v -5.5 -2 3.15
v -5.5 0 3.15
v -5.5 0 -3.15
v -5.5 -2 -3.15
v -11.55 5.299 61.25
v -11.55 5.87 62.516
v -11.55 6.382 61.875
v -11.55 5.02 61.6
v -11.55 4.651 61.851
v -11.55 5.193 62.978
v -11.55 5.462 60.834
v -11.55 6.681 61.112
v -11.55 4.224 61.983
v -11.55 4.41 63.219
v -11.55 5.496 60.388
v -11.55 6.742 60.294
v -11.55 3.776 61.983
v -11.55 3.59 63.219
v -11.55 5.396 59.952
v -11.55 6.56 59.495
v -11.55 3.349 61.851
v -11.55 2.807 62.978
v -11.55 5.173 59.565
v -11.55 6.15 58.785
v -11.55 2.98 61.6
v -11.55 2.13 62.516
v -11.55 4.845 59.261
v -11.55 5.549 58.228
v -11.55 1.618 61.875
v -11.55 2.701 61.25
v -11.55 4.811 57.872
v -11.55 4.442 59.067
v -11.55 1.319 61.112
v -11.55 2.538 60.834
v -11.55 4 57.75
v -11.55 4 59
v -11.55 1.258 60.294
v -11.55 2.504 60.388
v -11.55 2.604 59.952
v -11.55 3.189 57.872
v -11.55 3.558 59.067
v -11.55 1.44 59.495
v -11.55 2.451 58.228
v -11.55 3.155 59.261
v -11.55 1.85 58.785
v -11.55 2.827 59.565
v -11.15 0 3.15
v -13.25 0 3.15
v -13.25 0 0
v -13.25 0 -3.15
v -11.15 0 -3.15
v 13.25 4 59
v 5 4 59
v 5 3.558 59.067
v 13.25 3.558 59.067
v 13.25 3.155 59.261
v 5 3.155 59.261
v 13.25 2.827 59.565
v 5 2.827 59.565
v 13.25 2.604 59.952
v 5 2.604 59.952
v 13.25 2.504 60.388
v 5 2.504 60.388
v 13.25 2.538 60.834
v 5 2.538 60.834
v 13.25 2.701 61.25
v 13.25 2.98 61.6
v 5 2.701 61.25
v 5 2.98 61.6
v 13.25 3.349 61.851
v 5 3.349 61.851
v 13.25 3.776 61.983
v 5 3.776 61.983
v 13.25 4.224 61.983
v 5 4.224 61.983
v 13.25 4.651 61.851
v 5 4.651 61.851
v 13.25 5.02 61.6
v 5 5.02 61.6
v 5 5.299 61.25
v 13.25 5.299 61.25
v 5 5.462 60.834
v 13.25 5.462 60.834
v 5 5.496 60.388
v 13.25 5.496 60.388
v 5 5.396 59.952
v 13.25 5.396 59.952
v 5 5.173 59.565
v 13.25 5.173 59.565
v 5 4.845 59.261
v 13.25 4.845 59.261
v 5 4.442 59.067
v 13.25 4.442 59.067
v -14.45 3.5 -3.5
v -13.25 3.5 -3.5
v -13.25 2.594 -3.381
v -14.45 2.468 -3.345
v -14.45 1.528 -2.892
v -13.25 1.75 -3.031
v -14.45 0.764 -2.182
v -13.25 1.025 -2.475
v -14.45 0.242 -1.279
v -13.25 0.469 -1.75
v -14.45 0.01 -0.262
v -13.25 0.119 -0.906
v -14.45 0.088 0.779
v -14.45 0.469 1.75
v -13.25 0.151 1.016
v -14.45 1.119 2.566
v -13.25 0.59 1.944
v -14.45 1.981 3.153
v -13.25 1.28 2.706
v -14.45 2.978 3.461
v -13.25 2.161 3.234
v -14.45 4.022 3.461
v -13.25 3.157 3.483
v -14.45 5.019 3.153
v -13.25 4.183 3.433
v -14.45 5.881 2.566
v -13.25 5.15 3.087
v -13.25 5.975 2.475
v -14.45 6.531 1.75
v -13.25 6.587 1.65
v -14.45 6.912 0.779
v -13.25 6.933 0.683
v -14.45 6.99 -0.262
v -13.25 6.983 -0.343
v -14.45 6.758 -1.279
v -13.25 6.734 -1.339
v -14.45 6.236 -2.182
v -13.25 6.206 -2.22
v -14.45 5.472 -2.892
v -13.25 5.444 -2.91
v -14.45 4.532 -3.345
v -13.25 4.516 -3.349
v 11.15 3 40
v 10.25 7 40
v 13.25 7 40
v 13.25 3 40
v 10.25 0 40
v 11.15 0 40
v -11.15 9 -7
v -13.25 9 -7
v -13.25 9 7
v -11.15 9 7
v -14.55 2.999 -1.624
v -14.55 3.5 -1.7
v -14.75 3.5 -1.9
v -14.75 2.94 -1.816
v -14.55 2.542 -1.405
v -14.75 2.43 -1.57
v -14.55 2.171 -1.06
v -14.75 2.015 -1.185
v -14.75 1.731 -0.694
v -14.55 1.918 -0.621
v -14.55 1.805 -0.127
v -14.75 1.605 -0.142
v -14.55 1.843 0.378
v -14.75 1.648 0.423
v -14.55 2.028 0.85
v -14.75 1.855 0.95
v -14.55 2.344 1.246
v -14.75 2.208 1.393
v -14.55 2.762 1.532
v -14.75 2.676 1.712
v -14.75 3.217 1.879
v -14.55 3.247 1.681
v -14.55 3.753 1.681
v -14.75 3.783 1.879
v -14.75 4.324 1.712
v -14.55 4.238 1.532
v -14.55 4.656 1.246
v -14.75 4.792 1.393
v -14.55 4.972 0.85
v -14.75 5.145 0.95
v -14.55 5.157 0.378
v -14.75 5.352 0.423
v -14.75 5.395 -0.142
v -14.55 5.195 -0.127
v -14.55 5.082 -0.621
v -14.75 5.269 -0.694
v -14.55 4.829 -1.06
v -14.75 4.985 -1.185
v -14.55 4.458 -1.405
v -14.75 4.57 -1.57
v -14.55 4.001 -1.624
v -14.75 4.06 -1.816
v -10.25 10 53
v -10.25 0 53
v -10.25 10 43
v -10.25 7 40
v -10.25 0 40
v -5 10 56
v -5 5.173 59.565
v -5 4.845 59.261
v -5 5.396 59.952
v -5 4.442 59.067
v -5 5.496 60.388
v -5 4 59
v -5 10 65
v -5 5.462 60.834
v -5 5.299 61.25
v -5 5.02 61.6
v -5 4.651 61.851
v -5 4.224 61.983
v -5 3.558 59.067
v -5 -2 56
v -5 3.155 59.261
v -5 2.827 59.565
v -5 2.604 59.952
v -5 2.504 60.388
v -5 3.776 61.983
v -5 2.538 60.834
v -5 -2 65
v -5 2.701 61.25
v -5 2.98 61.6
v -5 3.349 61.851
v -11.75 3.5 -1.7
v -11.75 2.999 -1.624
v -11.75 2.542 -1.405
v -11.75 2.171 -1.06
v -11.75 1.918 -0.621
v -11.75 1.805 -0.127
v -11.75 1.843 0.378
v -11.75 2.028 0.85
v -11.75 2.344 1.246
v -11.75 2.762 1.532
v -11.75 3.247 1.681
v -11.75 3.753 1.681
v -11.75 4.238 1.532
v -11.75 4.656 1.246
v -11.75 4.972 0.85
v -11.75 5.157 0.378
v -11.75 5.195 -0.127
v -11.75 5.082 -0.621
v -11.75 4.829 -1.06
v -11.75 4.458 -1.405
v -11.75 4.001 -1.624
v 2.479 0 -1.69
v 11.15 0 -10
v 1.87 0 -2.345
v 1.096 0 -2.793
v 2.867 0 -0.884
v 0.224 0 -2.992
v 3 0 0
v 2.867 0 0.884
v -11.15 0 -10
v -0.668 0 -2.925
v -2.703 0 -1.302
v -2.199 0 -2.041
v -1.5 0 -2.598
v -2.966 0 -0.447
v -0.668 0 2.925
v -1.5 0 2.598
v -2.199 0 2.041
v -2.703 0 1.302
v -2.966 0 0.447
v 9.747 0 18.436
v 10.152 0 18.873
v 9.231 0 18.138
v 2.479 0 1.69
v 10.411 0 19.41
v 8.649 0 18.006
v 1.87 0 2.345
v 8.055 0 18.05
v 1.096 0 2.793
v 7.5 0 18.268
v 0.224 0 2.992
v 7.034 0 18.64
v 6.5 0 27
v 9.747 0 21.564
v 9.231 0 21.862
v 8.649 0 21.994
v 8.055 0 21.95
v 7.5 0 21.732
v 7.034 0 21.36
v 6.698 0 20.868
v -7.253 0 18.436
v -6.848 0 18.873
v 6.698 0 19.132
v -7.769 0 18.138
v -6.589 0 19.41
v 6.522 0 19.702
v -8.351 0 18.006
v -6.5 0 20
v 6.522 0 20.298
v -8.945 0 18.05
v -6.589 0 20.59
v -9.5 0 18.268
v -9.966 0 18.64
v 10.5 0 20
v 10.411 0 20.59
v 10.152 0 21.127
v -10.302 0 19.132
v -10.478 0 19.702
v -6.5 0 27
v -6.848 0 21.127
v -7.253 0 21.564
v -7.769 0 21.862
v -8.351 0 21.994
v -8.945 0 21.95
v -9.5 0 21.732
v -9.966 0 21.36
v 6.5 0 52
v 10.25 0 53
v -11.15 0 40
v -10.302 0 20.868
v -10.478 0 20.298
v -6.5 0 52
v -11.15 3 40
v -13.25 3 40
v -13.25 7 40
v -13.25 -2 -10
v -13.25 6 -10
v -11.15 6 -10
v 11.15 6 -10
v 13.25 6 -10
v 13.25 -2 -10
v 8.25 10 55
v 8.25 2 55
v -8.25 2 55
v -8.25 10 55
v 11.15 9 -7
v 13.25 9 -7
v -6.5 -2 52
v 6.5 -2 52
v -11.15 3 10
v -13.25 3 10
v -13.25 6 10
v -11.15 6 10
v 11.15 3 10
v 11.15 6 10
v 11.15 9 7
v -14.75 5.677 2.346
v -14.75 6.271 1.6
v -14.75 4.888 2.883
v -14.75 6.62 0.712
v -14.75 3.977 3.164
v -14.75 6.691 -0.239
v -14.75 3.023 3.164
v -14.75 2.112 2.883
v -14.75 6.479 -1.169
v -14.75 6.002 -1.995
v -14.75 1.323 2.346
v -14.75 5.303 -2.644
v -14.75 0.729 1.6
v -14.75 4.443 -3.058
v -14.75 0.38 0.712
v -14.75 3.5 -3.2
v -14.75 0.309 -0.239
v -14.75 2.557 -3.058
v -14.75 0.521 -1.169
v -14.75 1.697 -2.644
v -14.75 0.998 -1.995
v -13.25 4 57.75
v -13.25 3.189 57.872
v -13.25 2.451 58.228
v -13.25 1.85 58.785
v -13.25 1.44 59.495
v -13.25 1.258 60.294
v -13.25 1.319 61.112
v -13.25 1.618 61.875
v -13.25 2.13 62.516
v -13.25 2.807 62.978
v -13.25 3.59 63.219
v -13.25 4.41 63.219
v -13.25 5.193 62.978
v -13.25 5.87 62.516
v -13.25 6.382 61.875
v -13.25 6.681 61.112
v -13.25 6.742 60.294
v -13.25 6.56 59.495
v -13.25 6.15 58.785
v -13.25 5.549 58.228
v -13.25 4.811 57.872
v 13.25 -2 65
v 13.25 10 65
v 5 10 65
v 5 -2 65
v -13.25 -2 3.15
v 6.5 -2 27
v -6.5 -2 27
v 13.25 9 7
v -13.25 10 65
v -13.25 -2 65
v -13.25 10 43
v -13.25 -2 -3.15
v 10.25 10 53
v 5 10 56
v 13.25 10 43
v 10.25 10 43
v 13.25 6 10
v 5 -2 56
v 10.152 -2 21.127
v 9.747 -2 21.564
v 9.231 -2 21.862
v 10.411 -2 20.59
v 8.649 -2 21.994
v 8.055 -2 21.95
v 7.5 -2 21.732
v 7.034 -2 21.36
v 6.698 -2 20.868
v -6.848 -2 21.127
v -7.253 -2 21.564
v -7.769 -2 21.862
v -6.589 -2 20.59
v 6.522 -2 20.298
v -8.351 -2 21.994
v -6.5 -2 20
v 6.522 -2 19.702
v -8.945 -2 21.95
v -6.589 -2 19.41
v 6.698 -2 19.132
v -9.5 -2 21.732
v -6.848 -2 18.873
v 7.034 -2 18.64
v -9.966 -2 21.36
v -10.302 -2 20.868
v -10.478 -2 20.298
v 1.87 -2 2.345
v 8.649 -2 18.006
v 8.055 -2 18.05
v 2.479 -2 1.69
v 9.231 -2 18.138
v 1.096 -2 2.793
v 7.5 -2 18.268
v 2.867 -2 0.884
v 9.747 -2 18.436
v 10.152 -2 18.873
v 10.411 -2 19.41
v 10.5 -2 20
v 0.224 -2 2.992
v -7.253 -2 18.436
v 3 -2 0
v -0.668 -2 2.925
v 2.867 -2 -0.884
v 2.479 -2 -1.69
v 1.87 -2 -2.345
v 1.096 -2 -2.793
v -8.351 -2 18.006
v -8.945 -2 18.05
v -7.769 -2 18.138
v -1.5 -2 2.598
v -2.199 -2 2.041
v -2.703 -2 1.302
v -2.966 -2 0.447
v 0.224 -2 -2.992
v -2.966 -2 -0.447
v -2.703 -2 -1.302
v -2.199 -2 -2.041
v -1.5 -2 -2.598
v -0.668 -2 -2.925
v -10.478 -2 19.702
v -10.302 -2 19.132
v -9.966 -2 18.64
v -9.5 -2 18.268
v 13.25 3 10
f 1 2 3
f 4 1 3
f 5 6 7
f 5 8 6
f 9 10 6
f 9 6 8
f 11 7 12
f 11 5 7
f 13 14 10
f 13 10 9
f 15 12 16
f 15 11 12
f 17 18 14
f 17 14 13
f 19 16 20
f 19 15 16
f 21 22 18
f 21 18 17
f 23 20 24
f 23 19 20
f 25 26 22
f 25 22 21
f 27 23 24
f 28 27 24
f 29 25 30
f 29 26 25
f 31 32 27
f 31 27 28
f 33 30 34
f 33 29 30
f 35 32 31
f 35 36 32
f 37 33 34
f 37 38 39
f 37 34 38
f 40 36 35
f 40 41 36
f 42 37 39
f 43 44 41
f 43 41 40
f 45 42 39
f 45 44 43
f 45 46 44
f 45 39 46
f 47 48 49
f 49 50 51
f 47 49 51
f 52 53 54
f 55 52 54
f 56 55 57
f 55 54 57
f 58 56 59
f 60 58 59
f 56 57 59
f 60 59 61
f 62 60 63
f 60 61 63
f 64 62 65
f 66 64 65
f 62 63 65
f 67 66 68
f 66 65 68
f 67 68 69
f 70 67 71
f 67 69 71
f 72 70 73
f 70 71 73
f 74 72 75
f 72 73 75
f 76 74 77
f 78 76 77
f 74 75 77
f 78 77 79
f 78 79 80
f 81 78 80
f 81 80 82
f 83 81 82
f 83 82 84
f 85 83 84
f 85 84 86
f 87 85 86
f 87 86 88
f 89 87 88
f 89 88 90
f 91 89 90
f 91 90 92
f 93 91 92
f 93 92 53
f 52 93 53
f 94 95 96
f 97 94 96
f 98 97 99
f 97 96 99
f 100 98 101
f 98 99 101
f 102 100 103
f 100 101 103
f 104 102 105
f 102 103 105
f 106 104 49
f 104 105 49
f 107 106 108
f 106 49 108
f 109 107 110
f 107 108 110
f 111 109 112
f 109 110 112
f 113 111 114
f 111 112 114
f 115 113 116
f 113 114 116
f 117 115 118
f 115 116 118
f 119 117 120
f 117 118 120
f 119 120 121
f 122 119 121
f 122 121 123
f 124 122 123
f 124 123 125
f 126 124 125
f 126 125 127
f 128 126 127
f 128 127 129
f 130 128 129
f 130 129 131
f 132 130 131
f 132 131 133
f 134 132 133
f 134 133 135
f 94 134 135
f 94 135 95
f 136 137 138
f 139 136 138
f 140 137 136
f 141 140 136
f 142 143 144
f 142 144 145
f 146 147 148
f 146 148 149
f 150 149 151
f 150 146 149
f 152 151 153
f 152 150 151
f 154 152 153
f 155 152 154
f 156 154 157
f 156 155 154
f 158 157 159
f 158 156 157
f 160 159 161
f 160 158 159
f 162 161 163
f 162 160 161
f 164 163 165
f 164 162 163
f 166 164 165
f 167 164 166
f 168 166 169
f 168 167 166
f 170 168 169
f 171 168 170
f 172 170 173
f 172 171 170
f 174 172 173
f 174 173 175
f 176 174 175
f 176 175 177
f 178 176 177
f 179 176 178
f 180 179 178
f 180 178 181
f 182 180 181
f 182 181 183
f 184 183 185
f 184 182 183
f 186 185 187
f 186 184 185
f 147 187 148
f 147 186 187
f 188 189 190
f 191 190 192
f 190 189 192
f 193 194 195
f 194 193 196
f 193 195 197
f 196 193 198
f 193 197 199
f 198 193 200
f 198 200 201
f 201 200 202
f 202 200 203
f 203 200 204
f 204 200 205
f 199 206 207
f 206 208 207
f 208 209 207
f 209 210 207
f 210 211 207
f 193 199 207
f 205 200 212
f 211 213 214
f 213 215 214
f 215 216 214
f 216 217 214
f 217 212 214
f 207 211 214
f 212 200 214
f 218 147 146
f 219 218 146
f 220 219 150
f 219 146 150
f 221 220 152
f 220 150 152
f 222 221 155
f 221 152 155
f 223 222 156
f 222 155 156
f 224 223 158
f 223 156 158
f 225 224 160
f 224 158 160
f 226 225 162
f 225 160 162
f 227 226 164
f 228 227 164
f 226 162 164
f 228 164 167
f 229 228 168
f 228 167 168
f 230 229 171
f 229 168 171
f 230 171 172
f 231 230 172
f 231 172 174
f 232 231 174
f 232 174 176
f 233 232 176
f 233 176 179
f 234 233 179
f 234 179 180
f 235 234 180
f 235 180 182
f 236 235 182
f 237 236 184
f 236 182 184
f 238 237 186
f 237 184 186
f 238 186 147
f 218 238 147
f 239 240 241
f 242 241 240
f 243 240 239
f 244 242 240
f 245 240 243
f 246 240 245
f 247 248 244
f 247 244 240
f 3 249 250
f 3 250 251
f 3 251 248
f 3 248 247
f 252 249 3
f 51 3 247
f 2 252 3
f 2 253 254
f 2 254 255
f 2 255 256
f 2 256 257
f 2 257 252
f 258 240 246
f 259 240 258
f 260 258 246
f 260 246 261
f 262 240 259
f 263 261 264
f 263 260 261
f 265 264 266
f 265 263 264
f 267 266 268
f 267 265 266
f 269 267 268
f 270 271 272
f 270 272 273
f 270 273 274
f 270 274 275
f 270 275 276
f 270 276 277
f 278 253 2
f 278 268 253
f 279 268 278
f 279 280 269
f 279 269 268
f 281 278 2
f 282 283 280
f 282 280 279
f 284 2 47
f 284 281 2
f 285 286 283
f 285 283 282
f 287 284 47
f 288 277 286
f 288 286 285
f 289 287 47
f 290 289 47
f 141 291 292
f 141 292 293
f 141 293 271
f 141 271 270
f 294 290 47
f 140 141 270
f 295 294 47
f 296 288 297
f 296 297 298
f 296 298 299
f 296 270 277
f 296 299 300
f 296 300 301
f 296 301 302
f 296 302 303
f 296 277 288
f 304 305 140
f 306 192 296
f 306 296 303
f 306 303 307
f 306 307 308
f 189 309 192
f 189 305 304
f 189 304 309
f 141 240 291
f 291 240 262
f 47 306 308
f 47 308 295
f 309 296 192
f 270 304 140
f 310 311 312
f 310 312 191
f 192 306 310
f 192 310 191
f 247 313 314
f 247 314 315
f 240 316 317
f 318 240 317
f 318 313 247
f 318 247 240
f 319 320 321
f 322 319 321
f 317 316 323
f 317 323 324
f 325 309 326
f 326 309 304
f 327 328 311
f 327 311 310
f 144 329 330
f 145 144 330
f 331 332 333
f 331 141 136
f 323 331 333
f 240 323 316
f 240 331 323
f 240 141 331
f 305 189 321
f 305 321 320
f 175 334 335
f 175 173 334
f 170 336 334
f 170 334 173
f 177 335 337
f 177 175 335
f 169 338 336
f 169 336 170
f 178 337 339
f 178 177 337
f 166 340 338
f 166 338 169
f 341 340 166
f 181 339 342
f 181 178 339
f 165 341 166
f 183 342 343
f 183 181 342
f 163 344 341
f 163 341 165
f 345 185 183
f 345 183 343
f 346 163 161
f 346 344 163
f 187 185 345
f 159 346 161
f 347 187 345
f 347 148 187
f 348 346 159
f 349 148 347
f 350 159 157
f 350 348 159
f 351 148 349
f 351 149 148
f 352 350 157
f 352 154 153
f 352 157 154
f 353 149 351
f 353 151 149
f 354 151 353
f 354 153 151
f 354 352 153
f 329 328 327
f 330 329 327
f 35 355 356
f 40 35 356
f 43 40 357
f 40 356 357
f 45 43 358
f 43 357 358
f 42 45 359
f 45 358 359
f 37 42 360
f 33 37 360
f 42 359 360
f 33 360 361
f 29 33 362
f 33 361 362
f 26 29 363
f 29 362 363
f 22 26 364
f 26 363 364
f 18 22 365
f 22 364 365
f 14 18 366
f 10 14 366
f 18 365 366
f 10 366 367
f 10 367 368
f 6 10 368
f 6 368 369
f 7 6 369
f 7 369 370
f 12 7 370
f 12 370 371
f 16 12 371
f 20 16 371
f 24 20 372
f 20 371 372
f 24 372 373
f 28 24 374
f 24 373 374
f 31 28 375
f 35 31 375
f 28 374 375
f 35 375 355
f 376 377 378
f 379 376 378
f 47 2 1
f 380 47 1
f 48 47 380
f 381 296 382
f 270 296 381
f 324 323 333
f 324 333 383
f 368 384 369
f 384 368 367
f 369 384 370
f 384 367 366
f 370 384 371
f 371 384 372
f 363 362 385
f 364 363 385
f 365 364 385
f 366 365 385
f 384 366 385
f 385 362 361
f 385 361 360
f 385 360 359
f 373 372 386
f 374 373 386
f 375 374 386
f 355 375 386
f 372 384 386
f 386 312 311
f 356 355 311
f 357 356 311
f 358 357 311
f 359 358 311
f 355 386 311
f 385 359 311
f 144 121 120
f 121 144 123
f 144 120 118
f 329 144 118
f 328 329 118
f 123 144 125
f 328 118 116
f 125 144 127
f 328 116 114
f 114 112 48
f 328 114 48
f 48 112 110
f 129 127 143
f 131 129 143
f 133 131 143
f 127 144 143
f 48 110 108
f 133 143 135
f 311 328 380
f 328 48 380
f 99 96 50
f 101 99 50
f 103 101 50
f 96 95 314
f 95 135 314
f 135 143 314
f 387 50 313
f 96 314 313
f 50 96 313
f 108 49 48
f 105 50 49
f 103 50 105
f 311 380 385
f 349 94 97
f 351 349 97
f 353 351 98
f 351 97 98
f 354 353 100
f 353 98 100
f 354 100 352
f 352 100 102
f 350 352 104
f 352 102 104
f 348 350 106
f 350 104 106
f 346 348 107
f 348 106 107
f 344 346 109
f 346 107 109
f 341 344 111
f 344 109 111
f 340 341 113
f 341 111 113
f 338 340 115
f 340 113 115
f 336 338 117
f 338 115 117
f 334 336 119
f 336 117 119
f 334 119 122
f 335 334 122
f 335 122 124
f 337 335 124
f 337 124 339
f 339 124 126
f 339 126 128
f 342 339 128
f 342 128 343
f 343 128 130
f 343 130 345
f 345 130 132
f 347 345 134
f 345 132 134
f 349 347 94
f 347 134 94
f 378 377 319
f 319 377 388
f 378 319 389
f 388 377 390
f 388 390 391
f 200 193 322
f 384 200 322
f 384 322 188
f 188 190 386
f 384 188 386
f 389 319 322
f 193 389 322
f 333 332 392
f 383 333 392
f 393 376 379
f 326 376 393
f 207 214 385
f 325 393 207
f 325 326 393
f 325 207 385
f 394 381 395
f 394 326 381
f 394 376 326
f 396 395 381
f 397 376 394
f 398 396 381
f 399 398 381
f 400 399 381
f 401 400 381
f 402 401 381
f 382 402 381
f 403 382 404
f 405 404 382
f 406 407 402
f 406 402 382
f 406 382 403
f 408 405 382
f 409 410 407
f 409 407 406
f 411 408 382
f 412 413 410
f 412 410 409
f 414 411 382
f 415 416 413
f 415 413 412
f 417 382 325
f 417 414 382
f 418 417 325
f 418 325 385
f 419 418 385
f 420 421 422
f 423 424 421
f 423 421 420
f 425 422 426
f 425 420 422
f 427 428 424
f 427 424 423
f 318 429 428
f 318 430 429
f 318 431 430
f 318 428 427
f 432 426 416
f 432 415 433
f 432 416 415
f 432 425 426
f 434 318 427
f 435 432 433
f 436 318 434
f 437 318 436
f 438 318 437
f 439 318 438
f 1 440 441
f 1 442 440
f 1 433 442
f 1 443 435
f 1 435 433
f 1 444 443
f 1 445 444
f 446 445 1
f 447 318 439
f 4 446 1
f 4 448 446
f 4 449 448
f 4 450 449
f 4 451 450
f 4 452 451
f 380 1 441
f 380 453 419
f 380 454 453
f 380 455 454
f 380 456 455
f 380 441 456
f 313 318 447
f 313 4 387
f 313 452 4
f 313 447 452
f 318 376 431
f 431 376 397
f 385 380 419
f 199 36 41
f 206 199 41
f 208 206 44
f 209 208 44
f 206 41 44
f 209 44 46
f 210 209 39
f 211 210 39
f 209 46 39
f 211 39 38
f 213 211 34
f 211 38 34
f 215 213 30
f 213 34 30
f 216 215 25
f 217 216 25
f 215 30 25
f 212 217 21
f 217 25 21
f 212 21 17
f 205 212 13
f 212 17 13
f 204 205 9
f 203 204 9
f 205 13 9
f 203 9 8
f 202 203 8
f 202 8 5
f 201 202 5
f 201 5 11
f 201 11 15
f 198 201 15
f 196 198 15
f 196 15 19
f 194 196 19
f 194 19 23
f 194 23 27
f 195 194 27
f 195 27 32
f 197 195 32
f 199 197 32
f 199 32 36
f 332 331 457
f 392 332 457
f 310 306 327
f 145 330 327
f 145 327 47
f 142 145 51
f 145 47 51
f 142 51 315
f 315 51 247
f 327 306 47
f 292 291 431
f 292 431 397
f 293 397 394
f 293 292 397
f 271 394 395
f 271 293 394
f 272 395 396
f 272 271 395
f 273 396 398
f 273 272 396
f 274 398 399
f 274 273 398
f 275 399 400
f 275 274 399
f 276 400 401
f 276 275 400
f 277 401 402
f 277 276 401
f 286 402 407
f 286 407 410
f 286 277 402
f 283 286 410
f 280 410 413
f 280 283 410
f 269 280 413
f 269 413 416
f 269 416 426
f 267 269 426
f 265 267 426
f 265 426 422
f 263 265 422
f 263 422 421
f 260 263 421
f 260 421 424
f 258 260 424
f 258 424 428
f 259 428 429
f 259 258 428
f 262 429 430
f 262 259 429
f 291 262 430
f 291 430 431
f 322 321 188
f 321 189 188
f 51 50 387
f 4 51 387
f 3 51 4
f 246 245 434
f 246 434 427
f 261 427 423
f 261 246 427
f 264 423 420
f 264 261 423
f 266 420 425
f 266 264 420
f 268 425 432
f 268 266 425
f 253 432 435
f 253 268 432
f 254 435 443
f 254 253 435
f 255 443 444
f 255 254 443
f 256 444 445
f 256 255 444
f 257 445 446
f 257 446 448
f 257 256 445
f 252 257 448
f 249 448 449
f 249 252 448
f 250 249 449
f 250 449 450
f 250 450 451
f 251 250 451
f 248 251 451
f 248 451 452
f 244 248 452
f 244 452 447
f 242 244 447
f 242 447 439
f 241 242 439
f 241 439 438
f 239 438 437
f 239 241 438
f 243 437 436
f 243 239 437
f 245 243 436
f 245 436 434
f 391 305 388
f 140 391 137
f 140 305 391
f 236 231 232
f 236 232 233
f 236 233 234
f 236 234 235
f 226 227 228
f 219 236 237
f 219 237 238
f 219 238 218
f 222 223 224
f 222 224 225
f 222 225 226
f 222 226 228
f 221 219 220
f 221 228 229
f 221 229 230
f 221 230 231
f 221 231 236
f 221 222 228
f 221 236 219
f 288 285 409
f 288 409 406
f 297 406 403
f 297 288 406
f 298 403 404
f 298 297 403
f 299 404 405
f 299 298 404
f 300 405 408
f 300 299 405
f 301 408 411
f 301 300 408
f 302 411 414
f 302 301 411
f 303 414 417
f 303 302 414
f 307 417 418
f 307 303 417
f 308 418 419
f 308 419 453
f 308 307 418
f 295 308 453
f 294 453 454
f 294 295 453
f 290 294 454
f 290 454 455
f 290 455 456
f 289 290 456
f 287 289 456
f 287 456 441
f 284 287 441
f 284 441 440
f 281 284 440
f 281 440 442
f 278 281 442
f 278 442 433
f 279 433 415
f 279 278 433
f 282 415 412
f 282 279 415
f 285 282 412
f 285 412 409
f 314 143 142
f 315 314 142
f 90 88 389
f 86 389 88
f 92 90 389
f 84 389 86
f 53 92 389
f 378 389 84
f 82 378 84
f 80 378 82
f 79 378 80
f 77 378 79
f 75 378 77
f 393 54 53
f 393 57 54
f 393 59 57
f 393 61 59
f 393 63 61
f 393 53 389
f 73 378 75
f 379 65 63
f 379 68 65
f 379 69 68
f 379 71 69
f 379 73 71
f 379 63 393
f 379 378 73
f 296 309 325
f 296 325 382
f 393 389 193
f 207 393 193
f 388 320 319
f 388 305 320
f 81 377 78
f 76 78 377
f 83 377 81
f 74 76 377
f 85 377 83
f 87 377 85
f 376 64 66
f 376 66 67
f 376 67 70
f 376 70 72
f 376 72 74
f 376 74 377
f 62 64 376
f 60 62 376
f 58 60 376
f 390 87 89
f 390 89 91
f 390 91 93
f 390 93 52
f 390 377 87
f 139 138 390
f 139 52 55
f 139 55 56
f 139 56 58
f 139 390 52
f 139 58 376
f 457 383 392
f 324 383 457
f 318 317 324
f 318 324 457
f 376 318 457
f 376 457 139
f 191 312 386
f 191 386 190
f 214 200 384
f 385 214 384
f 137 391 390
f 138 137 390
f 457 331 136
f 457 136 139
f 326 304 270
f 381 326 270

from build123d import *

# Parameters (mm, degrees)
SKETCH_R        = 2
SKETCH_R_2      = 3
PAD_DEPTH       = 2
SKETCH001_W     = 2.1
SKETCH001_H     = 20
PAD001_DEPTH    = 9
CHAMFER_SIZE    = 3
SKETCH002_W     = 13
SKETCH002_H     = 25
POCKET_DEPTH    = 2.5
SKETCH003_R     = 3.5
PAD002_DEPTH    = 1.5
SKETCH004_R     = 1.7
POCKET001_DEPTH = 3
CHAMFER001_SIZE = 0.2
CHAMFER002_SIZE = 0.3
SKETCH005_W     = 3
SKETCH005_H     = 15
PAD003_DEPTH    = 10
CHAMFER003_SIZE = 3
CHAMFER004_SIZE = 3
SKETCH006_W     = 2.1
SKETCH006_H     = 30
PAD004_DEPTH    = 3
SKETCH007_W     = 26.5
SKETCH007_H     = 12
PAD005_DEPTH    = 10
CHAMFER005_SIZE = 2
CHAMFER006_SIZE = 2
CHAMFER007_SIZE = 2
SKETCH008_W     = 10
SKETCH008_H     = 12
POCKET002_DEPTH = 9
SKETCH009_R     = 1.5
POCKET003_DEPTH = 26.501
SKETCH010_R     = 2.75
POCKET004_DEPTH = 1.7


with BuildPart() as part:
    # Sketch → Pad (new body)
    with BuildSketch(Plane.XZ):
        Polygon((-13.25, 55), (13.25, 55), (13.25, -10), (-13.25, -10), (-13.25, -3.15), (-5.5, -3.15), (-5.5, 0), (-5.5, 3.15), (-13.25, 3.15), align=None)
        with Locations((-8.5, 20)):
            Circle(SKETCH_R, mode=Mode.SUBTRACT)
        with Locations((8.5, 20)):
            Circle(SKETCH_R, mode=Mode.SUBTRACT)
        Circle(SKETCH_R_2, mode=Mode.SUBTRACT)
    extrude(amount=PAD_DEPTH)

    # Sketch001 (on Face13 of Pad) → Pad001 (join)
    with BuildSketch(Plane(origin=(0, 0, 0), x_dir=(1, 0, 0), z_dir=(0, 1, 0))):
        with Locations((-12.2, 0)):
            Rectangle(SKETCH001_W, SKETCH001_H)
        with Locations((12.2, 0)):
            Rectangle(SKETCH001_W, SKETCH001_H)
    extrude(amount=PAD001_DEPTH)

    # Chamfer
    chamfer_edges = [part.edges().sort_by_distance(p)[0] for p in [
        (-12.2, 9, -10),
        (12.2, 9, -10),
        (12.2, 9, 10),
        (-12.2, 9, 10),
    ]]
    chamfer(chamfer_edges, length=CHAMFER_SIZE)

    # Sketch002 (on Face4 of Chamfer) → Pocket (cut)
    with BuildSketch(Plane(origin=(0, 0, 0), x_dir=(1, 0, 0), z_dir=(0, 1, 0))):
        with Locations((0, -39.5)):
            Rectangle(SKETCH002_W, SKETCH002_H)
    extrude(amount=-POCKET_DEPTH, mode=Mode.SUBTRACT)

    # Sketch003 (on Face9 of Pocket) → Pad002 (join)
    with BuildSketch(Plane(origin=(-13.25, 0, 0), x_dir=(0, 0, -1), z_dir=(-1, 0, 0))):
        with Locations((0, -3.5)):
            Circle(SKETCH003_R)
    extrude(amount=PAD002_DEPTH)

    # Sketch004 (on Face35 of Pad002) → Pocket001 (cut)
    with BuildSketch(Plane(origin=(-14.75, 0, 0), x_dir=(0, 0, -1), z_dir=(-1, 0, 0))):
        with Locations((0, -3.5)):
            Circle(SKETCH004_R)
    extrude(amount=-POCKET001_DEPTH, mode=Mode.SUBTRACT)

    # Chamfer001
    chamfer001_edges = [part.edges().sort_by_distance(p)[0] for p in [
        (-14.75, 3.5, 1.7),
    ]]
    chamfer(chamfer001_edges, length=CHAMFER001_SIZE)

    # Chamfer002
    chamfer002_edges = [part.edges().sort_by_distance(p)[0] for p in [
        (-14.75, 3.5, 3.5),
    ]]
    chamfer(chamfer002_edges, length=CHAMFER002_SIZE)

    # Sketch005 (on Face17 of Chamfer002) → Pad003 (join)
    with BuildSketch(Plane(origin=(0, 0, 0), x_dir=(1, 0, 0), z_dir=(0, 1, 0))):
        with Locations((-11.75, -47.5)):
            Rectangle(SKETCH005_W, SKETCH005_H)
        with Locations((11.75, -47.5)):
            Rectangle(SKETCH005_W, SKETCH005_H)
    extrude(amount=PAD003_DEPTH)

    # Chamfer003
    chamfer003_edges = [part.edges().sort_by_distance(p)[0] for p in [
        (11.75, 10, 40),
    ]]
    chamfer(chamfer003_edges, length=CHAMFER003_SIZE)

    # Chamfer004
    chamfer004_edges = [part.edges().sort_by_distance(p)[0] for p in [
        (-11.75, 10, 40),
    ]]
    chamfer(chamfer004_edges, length=CHAMFER004_SIZE)

    # Sketch006 (on Face4 of Chamfer004) → Pad004 (join)
    with BuildSketch(Plane(origin=(0, 0, 0), x_dir=(1, 0, 0), z_dir=(0, 1, 0))):
        with Locations((-12.2, -25)):
            Rectangle(SKETCH006_W, SKETCH006_H)
        with Locations((12.2, -25)):
            Rectangle(SKETCH006_W, SKETCH006_H)
    extrude(amount=PAD004_DEPTH)

    # Sketch007 (on Face17 of Pad004) → Pad005 (join)
    with BuildSketch(Plane(origin=(0, 0, 55), x_dir=(-1, 0, 0), z_dir=(0, 0, 1))):
        with Locations((0, -4)):
            Rectangle(SKETCH007_W, SKETCH007_H)
    extrude(amount=PAD005_DEPTH)

    # Chamfer005
    chamfer005_edges = [part.edges().sort_by_distance(p)[0] for p in [
        (-10.25, 5, 55),
    ]]
    chamfer(chamfer005_edges, length=CHAMFER005_SIZE)

    # Chamfer006
    chamfer006_edges = [part.edges().sort_by_distance(p)[0] for p in [
        (10.25, 5, 55),
    ]]
    chamfer(chamfer006_edges, length=CHAMFER006_SIZE)

    # Chamfer007
    chamfer007_edges = [part.edges().sort_by_distance(p)[0] for p in [
        (0, 0, 55),
    ]]
    chamfer(chamfer007_edges, length=CHAMFER007_SIZE)

    # Sketch008 (on Face57 of Chamfer007) → Pocket002 (cut)
    with BuildSketch(Plane(origin=(0, 0, 65), x_dir=(-1, 0, 0), z_dir=(0, 0, 1))):
        with Locations((0, -4)):
            Rectangle(SKETCH008_W, SKETCH008_H)
    extrude(amount=-POCKET002_DEPTH, mode=Mode.SUBTRACT)

    # Sketch009 (on Face51 of Pocket002) → Pocket003 (cut, through all)
    with BuildSketch(Plane(origin=(-13.25, 0, 0), x_dir=(0, 0, -1), z_dir=(-1, 0, 0))):
        with Locations((-60.5, -4)):
            Circle(SKETCH009_R)
    extrude(amount=-POCKET003_DEPTH, mode=Mode.SUBTRACT)

    # Sketch010 (on Face51 of Pocket003) → Pocket004 (cut)
    with BuildSketch(Plane(origin=(-13.25, 0, 0), x_dir=(0, 0, -1), z_dir=(-1, 0, 0))):
        with Locations((-60.5, -4)):
            Circle(SKETCH010_R)
    extrude(amount=-POCKET004_DEPTH, mode=Mode.SUBTRACT)


solid = part.part
